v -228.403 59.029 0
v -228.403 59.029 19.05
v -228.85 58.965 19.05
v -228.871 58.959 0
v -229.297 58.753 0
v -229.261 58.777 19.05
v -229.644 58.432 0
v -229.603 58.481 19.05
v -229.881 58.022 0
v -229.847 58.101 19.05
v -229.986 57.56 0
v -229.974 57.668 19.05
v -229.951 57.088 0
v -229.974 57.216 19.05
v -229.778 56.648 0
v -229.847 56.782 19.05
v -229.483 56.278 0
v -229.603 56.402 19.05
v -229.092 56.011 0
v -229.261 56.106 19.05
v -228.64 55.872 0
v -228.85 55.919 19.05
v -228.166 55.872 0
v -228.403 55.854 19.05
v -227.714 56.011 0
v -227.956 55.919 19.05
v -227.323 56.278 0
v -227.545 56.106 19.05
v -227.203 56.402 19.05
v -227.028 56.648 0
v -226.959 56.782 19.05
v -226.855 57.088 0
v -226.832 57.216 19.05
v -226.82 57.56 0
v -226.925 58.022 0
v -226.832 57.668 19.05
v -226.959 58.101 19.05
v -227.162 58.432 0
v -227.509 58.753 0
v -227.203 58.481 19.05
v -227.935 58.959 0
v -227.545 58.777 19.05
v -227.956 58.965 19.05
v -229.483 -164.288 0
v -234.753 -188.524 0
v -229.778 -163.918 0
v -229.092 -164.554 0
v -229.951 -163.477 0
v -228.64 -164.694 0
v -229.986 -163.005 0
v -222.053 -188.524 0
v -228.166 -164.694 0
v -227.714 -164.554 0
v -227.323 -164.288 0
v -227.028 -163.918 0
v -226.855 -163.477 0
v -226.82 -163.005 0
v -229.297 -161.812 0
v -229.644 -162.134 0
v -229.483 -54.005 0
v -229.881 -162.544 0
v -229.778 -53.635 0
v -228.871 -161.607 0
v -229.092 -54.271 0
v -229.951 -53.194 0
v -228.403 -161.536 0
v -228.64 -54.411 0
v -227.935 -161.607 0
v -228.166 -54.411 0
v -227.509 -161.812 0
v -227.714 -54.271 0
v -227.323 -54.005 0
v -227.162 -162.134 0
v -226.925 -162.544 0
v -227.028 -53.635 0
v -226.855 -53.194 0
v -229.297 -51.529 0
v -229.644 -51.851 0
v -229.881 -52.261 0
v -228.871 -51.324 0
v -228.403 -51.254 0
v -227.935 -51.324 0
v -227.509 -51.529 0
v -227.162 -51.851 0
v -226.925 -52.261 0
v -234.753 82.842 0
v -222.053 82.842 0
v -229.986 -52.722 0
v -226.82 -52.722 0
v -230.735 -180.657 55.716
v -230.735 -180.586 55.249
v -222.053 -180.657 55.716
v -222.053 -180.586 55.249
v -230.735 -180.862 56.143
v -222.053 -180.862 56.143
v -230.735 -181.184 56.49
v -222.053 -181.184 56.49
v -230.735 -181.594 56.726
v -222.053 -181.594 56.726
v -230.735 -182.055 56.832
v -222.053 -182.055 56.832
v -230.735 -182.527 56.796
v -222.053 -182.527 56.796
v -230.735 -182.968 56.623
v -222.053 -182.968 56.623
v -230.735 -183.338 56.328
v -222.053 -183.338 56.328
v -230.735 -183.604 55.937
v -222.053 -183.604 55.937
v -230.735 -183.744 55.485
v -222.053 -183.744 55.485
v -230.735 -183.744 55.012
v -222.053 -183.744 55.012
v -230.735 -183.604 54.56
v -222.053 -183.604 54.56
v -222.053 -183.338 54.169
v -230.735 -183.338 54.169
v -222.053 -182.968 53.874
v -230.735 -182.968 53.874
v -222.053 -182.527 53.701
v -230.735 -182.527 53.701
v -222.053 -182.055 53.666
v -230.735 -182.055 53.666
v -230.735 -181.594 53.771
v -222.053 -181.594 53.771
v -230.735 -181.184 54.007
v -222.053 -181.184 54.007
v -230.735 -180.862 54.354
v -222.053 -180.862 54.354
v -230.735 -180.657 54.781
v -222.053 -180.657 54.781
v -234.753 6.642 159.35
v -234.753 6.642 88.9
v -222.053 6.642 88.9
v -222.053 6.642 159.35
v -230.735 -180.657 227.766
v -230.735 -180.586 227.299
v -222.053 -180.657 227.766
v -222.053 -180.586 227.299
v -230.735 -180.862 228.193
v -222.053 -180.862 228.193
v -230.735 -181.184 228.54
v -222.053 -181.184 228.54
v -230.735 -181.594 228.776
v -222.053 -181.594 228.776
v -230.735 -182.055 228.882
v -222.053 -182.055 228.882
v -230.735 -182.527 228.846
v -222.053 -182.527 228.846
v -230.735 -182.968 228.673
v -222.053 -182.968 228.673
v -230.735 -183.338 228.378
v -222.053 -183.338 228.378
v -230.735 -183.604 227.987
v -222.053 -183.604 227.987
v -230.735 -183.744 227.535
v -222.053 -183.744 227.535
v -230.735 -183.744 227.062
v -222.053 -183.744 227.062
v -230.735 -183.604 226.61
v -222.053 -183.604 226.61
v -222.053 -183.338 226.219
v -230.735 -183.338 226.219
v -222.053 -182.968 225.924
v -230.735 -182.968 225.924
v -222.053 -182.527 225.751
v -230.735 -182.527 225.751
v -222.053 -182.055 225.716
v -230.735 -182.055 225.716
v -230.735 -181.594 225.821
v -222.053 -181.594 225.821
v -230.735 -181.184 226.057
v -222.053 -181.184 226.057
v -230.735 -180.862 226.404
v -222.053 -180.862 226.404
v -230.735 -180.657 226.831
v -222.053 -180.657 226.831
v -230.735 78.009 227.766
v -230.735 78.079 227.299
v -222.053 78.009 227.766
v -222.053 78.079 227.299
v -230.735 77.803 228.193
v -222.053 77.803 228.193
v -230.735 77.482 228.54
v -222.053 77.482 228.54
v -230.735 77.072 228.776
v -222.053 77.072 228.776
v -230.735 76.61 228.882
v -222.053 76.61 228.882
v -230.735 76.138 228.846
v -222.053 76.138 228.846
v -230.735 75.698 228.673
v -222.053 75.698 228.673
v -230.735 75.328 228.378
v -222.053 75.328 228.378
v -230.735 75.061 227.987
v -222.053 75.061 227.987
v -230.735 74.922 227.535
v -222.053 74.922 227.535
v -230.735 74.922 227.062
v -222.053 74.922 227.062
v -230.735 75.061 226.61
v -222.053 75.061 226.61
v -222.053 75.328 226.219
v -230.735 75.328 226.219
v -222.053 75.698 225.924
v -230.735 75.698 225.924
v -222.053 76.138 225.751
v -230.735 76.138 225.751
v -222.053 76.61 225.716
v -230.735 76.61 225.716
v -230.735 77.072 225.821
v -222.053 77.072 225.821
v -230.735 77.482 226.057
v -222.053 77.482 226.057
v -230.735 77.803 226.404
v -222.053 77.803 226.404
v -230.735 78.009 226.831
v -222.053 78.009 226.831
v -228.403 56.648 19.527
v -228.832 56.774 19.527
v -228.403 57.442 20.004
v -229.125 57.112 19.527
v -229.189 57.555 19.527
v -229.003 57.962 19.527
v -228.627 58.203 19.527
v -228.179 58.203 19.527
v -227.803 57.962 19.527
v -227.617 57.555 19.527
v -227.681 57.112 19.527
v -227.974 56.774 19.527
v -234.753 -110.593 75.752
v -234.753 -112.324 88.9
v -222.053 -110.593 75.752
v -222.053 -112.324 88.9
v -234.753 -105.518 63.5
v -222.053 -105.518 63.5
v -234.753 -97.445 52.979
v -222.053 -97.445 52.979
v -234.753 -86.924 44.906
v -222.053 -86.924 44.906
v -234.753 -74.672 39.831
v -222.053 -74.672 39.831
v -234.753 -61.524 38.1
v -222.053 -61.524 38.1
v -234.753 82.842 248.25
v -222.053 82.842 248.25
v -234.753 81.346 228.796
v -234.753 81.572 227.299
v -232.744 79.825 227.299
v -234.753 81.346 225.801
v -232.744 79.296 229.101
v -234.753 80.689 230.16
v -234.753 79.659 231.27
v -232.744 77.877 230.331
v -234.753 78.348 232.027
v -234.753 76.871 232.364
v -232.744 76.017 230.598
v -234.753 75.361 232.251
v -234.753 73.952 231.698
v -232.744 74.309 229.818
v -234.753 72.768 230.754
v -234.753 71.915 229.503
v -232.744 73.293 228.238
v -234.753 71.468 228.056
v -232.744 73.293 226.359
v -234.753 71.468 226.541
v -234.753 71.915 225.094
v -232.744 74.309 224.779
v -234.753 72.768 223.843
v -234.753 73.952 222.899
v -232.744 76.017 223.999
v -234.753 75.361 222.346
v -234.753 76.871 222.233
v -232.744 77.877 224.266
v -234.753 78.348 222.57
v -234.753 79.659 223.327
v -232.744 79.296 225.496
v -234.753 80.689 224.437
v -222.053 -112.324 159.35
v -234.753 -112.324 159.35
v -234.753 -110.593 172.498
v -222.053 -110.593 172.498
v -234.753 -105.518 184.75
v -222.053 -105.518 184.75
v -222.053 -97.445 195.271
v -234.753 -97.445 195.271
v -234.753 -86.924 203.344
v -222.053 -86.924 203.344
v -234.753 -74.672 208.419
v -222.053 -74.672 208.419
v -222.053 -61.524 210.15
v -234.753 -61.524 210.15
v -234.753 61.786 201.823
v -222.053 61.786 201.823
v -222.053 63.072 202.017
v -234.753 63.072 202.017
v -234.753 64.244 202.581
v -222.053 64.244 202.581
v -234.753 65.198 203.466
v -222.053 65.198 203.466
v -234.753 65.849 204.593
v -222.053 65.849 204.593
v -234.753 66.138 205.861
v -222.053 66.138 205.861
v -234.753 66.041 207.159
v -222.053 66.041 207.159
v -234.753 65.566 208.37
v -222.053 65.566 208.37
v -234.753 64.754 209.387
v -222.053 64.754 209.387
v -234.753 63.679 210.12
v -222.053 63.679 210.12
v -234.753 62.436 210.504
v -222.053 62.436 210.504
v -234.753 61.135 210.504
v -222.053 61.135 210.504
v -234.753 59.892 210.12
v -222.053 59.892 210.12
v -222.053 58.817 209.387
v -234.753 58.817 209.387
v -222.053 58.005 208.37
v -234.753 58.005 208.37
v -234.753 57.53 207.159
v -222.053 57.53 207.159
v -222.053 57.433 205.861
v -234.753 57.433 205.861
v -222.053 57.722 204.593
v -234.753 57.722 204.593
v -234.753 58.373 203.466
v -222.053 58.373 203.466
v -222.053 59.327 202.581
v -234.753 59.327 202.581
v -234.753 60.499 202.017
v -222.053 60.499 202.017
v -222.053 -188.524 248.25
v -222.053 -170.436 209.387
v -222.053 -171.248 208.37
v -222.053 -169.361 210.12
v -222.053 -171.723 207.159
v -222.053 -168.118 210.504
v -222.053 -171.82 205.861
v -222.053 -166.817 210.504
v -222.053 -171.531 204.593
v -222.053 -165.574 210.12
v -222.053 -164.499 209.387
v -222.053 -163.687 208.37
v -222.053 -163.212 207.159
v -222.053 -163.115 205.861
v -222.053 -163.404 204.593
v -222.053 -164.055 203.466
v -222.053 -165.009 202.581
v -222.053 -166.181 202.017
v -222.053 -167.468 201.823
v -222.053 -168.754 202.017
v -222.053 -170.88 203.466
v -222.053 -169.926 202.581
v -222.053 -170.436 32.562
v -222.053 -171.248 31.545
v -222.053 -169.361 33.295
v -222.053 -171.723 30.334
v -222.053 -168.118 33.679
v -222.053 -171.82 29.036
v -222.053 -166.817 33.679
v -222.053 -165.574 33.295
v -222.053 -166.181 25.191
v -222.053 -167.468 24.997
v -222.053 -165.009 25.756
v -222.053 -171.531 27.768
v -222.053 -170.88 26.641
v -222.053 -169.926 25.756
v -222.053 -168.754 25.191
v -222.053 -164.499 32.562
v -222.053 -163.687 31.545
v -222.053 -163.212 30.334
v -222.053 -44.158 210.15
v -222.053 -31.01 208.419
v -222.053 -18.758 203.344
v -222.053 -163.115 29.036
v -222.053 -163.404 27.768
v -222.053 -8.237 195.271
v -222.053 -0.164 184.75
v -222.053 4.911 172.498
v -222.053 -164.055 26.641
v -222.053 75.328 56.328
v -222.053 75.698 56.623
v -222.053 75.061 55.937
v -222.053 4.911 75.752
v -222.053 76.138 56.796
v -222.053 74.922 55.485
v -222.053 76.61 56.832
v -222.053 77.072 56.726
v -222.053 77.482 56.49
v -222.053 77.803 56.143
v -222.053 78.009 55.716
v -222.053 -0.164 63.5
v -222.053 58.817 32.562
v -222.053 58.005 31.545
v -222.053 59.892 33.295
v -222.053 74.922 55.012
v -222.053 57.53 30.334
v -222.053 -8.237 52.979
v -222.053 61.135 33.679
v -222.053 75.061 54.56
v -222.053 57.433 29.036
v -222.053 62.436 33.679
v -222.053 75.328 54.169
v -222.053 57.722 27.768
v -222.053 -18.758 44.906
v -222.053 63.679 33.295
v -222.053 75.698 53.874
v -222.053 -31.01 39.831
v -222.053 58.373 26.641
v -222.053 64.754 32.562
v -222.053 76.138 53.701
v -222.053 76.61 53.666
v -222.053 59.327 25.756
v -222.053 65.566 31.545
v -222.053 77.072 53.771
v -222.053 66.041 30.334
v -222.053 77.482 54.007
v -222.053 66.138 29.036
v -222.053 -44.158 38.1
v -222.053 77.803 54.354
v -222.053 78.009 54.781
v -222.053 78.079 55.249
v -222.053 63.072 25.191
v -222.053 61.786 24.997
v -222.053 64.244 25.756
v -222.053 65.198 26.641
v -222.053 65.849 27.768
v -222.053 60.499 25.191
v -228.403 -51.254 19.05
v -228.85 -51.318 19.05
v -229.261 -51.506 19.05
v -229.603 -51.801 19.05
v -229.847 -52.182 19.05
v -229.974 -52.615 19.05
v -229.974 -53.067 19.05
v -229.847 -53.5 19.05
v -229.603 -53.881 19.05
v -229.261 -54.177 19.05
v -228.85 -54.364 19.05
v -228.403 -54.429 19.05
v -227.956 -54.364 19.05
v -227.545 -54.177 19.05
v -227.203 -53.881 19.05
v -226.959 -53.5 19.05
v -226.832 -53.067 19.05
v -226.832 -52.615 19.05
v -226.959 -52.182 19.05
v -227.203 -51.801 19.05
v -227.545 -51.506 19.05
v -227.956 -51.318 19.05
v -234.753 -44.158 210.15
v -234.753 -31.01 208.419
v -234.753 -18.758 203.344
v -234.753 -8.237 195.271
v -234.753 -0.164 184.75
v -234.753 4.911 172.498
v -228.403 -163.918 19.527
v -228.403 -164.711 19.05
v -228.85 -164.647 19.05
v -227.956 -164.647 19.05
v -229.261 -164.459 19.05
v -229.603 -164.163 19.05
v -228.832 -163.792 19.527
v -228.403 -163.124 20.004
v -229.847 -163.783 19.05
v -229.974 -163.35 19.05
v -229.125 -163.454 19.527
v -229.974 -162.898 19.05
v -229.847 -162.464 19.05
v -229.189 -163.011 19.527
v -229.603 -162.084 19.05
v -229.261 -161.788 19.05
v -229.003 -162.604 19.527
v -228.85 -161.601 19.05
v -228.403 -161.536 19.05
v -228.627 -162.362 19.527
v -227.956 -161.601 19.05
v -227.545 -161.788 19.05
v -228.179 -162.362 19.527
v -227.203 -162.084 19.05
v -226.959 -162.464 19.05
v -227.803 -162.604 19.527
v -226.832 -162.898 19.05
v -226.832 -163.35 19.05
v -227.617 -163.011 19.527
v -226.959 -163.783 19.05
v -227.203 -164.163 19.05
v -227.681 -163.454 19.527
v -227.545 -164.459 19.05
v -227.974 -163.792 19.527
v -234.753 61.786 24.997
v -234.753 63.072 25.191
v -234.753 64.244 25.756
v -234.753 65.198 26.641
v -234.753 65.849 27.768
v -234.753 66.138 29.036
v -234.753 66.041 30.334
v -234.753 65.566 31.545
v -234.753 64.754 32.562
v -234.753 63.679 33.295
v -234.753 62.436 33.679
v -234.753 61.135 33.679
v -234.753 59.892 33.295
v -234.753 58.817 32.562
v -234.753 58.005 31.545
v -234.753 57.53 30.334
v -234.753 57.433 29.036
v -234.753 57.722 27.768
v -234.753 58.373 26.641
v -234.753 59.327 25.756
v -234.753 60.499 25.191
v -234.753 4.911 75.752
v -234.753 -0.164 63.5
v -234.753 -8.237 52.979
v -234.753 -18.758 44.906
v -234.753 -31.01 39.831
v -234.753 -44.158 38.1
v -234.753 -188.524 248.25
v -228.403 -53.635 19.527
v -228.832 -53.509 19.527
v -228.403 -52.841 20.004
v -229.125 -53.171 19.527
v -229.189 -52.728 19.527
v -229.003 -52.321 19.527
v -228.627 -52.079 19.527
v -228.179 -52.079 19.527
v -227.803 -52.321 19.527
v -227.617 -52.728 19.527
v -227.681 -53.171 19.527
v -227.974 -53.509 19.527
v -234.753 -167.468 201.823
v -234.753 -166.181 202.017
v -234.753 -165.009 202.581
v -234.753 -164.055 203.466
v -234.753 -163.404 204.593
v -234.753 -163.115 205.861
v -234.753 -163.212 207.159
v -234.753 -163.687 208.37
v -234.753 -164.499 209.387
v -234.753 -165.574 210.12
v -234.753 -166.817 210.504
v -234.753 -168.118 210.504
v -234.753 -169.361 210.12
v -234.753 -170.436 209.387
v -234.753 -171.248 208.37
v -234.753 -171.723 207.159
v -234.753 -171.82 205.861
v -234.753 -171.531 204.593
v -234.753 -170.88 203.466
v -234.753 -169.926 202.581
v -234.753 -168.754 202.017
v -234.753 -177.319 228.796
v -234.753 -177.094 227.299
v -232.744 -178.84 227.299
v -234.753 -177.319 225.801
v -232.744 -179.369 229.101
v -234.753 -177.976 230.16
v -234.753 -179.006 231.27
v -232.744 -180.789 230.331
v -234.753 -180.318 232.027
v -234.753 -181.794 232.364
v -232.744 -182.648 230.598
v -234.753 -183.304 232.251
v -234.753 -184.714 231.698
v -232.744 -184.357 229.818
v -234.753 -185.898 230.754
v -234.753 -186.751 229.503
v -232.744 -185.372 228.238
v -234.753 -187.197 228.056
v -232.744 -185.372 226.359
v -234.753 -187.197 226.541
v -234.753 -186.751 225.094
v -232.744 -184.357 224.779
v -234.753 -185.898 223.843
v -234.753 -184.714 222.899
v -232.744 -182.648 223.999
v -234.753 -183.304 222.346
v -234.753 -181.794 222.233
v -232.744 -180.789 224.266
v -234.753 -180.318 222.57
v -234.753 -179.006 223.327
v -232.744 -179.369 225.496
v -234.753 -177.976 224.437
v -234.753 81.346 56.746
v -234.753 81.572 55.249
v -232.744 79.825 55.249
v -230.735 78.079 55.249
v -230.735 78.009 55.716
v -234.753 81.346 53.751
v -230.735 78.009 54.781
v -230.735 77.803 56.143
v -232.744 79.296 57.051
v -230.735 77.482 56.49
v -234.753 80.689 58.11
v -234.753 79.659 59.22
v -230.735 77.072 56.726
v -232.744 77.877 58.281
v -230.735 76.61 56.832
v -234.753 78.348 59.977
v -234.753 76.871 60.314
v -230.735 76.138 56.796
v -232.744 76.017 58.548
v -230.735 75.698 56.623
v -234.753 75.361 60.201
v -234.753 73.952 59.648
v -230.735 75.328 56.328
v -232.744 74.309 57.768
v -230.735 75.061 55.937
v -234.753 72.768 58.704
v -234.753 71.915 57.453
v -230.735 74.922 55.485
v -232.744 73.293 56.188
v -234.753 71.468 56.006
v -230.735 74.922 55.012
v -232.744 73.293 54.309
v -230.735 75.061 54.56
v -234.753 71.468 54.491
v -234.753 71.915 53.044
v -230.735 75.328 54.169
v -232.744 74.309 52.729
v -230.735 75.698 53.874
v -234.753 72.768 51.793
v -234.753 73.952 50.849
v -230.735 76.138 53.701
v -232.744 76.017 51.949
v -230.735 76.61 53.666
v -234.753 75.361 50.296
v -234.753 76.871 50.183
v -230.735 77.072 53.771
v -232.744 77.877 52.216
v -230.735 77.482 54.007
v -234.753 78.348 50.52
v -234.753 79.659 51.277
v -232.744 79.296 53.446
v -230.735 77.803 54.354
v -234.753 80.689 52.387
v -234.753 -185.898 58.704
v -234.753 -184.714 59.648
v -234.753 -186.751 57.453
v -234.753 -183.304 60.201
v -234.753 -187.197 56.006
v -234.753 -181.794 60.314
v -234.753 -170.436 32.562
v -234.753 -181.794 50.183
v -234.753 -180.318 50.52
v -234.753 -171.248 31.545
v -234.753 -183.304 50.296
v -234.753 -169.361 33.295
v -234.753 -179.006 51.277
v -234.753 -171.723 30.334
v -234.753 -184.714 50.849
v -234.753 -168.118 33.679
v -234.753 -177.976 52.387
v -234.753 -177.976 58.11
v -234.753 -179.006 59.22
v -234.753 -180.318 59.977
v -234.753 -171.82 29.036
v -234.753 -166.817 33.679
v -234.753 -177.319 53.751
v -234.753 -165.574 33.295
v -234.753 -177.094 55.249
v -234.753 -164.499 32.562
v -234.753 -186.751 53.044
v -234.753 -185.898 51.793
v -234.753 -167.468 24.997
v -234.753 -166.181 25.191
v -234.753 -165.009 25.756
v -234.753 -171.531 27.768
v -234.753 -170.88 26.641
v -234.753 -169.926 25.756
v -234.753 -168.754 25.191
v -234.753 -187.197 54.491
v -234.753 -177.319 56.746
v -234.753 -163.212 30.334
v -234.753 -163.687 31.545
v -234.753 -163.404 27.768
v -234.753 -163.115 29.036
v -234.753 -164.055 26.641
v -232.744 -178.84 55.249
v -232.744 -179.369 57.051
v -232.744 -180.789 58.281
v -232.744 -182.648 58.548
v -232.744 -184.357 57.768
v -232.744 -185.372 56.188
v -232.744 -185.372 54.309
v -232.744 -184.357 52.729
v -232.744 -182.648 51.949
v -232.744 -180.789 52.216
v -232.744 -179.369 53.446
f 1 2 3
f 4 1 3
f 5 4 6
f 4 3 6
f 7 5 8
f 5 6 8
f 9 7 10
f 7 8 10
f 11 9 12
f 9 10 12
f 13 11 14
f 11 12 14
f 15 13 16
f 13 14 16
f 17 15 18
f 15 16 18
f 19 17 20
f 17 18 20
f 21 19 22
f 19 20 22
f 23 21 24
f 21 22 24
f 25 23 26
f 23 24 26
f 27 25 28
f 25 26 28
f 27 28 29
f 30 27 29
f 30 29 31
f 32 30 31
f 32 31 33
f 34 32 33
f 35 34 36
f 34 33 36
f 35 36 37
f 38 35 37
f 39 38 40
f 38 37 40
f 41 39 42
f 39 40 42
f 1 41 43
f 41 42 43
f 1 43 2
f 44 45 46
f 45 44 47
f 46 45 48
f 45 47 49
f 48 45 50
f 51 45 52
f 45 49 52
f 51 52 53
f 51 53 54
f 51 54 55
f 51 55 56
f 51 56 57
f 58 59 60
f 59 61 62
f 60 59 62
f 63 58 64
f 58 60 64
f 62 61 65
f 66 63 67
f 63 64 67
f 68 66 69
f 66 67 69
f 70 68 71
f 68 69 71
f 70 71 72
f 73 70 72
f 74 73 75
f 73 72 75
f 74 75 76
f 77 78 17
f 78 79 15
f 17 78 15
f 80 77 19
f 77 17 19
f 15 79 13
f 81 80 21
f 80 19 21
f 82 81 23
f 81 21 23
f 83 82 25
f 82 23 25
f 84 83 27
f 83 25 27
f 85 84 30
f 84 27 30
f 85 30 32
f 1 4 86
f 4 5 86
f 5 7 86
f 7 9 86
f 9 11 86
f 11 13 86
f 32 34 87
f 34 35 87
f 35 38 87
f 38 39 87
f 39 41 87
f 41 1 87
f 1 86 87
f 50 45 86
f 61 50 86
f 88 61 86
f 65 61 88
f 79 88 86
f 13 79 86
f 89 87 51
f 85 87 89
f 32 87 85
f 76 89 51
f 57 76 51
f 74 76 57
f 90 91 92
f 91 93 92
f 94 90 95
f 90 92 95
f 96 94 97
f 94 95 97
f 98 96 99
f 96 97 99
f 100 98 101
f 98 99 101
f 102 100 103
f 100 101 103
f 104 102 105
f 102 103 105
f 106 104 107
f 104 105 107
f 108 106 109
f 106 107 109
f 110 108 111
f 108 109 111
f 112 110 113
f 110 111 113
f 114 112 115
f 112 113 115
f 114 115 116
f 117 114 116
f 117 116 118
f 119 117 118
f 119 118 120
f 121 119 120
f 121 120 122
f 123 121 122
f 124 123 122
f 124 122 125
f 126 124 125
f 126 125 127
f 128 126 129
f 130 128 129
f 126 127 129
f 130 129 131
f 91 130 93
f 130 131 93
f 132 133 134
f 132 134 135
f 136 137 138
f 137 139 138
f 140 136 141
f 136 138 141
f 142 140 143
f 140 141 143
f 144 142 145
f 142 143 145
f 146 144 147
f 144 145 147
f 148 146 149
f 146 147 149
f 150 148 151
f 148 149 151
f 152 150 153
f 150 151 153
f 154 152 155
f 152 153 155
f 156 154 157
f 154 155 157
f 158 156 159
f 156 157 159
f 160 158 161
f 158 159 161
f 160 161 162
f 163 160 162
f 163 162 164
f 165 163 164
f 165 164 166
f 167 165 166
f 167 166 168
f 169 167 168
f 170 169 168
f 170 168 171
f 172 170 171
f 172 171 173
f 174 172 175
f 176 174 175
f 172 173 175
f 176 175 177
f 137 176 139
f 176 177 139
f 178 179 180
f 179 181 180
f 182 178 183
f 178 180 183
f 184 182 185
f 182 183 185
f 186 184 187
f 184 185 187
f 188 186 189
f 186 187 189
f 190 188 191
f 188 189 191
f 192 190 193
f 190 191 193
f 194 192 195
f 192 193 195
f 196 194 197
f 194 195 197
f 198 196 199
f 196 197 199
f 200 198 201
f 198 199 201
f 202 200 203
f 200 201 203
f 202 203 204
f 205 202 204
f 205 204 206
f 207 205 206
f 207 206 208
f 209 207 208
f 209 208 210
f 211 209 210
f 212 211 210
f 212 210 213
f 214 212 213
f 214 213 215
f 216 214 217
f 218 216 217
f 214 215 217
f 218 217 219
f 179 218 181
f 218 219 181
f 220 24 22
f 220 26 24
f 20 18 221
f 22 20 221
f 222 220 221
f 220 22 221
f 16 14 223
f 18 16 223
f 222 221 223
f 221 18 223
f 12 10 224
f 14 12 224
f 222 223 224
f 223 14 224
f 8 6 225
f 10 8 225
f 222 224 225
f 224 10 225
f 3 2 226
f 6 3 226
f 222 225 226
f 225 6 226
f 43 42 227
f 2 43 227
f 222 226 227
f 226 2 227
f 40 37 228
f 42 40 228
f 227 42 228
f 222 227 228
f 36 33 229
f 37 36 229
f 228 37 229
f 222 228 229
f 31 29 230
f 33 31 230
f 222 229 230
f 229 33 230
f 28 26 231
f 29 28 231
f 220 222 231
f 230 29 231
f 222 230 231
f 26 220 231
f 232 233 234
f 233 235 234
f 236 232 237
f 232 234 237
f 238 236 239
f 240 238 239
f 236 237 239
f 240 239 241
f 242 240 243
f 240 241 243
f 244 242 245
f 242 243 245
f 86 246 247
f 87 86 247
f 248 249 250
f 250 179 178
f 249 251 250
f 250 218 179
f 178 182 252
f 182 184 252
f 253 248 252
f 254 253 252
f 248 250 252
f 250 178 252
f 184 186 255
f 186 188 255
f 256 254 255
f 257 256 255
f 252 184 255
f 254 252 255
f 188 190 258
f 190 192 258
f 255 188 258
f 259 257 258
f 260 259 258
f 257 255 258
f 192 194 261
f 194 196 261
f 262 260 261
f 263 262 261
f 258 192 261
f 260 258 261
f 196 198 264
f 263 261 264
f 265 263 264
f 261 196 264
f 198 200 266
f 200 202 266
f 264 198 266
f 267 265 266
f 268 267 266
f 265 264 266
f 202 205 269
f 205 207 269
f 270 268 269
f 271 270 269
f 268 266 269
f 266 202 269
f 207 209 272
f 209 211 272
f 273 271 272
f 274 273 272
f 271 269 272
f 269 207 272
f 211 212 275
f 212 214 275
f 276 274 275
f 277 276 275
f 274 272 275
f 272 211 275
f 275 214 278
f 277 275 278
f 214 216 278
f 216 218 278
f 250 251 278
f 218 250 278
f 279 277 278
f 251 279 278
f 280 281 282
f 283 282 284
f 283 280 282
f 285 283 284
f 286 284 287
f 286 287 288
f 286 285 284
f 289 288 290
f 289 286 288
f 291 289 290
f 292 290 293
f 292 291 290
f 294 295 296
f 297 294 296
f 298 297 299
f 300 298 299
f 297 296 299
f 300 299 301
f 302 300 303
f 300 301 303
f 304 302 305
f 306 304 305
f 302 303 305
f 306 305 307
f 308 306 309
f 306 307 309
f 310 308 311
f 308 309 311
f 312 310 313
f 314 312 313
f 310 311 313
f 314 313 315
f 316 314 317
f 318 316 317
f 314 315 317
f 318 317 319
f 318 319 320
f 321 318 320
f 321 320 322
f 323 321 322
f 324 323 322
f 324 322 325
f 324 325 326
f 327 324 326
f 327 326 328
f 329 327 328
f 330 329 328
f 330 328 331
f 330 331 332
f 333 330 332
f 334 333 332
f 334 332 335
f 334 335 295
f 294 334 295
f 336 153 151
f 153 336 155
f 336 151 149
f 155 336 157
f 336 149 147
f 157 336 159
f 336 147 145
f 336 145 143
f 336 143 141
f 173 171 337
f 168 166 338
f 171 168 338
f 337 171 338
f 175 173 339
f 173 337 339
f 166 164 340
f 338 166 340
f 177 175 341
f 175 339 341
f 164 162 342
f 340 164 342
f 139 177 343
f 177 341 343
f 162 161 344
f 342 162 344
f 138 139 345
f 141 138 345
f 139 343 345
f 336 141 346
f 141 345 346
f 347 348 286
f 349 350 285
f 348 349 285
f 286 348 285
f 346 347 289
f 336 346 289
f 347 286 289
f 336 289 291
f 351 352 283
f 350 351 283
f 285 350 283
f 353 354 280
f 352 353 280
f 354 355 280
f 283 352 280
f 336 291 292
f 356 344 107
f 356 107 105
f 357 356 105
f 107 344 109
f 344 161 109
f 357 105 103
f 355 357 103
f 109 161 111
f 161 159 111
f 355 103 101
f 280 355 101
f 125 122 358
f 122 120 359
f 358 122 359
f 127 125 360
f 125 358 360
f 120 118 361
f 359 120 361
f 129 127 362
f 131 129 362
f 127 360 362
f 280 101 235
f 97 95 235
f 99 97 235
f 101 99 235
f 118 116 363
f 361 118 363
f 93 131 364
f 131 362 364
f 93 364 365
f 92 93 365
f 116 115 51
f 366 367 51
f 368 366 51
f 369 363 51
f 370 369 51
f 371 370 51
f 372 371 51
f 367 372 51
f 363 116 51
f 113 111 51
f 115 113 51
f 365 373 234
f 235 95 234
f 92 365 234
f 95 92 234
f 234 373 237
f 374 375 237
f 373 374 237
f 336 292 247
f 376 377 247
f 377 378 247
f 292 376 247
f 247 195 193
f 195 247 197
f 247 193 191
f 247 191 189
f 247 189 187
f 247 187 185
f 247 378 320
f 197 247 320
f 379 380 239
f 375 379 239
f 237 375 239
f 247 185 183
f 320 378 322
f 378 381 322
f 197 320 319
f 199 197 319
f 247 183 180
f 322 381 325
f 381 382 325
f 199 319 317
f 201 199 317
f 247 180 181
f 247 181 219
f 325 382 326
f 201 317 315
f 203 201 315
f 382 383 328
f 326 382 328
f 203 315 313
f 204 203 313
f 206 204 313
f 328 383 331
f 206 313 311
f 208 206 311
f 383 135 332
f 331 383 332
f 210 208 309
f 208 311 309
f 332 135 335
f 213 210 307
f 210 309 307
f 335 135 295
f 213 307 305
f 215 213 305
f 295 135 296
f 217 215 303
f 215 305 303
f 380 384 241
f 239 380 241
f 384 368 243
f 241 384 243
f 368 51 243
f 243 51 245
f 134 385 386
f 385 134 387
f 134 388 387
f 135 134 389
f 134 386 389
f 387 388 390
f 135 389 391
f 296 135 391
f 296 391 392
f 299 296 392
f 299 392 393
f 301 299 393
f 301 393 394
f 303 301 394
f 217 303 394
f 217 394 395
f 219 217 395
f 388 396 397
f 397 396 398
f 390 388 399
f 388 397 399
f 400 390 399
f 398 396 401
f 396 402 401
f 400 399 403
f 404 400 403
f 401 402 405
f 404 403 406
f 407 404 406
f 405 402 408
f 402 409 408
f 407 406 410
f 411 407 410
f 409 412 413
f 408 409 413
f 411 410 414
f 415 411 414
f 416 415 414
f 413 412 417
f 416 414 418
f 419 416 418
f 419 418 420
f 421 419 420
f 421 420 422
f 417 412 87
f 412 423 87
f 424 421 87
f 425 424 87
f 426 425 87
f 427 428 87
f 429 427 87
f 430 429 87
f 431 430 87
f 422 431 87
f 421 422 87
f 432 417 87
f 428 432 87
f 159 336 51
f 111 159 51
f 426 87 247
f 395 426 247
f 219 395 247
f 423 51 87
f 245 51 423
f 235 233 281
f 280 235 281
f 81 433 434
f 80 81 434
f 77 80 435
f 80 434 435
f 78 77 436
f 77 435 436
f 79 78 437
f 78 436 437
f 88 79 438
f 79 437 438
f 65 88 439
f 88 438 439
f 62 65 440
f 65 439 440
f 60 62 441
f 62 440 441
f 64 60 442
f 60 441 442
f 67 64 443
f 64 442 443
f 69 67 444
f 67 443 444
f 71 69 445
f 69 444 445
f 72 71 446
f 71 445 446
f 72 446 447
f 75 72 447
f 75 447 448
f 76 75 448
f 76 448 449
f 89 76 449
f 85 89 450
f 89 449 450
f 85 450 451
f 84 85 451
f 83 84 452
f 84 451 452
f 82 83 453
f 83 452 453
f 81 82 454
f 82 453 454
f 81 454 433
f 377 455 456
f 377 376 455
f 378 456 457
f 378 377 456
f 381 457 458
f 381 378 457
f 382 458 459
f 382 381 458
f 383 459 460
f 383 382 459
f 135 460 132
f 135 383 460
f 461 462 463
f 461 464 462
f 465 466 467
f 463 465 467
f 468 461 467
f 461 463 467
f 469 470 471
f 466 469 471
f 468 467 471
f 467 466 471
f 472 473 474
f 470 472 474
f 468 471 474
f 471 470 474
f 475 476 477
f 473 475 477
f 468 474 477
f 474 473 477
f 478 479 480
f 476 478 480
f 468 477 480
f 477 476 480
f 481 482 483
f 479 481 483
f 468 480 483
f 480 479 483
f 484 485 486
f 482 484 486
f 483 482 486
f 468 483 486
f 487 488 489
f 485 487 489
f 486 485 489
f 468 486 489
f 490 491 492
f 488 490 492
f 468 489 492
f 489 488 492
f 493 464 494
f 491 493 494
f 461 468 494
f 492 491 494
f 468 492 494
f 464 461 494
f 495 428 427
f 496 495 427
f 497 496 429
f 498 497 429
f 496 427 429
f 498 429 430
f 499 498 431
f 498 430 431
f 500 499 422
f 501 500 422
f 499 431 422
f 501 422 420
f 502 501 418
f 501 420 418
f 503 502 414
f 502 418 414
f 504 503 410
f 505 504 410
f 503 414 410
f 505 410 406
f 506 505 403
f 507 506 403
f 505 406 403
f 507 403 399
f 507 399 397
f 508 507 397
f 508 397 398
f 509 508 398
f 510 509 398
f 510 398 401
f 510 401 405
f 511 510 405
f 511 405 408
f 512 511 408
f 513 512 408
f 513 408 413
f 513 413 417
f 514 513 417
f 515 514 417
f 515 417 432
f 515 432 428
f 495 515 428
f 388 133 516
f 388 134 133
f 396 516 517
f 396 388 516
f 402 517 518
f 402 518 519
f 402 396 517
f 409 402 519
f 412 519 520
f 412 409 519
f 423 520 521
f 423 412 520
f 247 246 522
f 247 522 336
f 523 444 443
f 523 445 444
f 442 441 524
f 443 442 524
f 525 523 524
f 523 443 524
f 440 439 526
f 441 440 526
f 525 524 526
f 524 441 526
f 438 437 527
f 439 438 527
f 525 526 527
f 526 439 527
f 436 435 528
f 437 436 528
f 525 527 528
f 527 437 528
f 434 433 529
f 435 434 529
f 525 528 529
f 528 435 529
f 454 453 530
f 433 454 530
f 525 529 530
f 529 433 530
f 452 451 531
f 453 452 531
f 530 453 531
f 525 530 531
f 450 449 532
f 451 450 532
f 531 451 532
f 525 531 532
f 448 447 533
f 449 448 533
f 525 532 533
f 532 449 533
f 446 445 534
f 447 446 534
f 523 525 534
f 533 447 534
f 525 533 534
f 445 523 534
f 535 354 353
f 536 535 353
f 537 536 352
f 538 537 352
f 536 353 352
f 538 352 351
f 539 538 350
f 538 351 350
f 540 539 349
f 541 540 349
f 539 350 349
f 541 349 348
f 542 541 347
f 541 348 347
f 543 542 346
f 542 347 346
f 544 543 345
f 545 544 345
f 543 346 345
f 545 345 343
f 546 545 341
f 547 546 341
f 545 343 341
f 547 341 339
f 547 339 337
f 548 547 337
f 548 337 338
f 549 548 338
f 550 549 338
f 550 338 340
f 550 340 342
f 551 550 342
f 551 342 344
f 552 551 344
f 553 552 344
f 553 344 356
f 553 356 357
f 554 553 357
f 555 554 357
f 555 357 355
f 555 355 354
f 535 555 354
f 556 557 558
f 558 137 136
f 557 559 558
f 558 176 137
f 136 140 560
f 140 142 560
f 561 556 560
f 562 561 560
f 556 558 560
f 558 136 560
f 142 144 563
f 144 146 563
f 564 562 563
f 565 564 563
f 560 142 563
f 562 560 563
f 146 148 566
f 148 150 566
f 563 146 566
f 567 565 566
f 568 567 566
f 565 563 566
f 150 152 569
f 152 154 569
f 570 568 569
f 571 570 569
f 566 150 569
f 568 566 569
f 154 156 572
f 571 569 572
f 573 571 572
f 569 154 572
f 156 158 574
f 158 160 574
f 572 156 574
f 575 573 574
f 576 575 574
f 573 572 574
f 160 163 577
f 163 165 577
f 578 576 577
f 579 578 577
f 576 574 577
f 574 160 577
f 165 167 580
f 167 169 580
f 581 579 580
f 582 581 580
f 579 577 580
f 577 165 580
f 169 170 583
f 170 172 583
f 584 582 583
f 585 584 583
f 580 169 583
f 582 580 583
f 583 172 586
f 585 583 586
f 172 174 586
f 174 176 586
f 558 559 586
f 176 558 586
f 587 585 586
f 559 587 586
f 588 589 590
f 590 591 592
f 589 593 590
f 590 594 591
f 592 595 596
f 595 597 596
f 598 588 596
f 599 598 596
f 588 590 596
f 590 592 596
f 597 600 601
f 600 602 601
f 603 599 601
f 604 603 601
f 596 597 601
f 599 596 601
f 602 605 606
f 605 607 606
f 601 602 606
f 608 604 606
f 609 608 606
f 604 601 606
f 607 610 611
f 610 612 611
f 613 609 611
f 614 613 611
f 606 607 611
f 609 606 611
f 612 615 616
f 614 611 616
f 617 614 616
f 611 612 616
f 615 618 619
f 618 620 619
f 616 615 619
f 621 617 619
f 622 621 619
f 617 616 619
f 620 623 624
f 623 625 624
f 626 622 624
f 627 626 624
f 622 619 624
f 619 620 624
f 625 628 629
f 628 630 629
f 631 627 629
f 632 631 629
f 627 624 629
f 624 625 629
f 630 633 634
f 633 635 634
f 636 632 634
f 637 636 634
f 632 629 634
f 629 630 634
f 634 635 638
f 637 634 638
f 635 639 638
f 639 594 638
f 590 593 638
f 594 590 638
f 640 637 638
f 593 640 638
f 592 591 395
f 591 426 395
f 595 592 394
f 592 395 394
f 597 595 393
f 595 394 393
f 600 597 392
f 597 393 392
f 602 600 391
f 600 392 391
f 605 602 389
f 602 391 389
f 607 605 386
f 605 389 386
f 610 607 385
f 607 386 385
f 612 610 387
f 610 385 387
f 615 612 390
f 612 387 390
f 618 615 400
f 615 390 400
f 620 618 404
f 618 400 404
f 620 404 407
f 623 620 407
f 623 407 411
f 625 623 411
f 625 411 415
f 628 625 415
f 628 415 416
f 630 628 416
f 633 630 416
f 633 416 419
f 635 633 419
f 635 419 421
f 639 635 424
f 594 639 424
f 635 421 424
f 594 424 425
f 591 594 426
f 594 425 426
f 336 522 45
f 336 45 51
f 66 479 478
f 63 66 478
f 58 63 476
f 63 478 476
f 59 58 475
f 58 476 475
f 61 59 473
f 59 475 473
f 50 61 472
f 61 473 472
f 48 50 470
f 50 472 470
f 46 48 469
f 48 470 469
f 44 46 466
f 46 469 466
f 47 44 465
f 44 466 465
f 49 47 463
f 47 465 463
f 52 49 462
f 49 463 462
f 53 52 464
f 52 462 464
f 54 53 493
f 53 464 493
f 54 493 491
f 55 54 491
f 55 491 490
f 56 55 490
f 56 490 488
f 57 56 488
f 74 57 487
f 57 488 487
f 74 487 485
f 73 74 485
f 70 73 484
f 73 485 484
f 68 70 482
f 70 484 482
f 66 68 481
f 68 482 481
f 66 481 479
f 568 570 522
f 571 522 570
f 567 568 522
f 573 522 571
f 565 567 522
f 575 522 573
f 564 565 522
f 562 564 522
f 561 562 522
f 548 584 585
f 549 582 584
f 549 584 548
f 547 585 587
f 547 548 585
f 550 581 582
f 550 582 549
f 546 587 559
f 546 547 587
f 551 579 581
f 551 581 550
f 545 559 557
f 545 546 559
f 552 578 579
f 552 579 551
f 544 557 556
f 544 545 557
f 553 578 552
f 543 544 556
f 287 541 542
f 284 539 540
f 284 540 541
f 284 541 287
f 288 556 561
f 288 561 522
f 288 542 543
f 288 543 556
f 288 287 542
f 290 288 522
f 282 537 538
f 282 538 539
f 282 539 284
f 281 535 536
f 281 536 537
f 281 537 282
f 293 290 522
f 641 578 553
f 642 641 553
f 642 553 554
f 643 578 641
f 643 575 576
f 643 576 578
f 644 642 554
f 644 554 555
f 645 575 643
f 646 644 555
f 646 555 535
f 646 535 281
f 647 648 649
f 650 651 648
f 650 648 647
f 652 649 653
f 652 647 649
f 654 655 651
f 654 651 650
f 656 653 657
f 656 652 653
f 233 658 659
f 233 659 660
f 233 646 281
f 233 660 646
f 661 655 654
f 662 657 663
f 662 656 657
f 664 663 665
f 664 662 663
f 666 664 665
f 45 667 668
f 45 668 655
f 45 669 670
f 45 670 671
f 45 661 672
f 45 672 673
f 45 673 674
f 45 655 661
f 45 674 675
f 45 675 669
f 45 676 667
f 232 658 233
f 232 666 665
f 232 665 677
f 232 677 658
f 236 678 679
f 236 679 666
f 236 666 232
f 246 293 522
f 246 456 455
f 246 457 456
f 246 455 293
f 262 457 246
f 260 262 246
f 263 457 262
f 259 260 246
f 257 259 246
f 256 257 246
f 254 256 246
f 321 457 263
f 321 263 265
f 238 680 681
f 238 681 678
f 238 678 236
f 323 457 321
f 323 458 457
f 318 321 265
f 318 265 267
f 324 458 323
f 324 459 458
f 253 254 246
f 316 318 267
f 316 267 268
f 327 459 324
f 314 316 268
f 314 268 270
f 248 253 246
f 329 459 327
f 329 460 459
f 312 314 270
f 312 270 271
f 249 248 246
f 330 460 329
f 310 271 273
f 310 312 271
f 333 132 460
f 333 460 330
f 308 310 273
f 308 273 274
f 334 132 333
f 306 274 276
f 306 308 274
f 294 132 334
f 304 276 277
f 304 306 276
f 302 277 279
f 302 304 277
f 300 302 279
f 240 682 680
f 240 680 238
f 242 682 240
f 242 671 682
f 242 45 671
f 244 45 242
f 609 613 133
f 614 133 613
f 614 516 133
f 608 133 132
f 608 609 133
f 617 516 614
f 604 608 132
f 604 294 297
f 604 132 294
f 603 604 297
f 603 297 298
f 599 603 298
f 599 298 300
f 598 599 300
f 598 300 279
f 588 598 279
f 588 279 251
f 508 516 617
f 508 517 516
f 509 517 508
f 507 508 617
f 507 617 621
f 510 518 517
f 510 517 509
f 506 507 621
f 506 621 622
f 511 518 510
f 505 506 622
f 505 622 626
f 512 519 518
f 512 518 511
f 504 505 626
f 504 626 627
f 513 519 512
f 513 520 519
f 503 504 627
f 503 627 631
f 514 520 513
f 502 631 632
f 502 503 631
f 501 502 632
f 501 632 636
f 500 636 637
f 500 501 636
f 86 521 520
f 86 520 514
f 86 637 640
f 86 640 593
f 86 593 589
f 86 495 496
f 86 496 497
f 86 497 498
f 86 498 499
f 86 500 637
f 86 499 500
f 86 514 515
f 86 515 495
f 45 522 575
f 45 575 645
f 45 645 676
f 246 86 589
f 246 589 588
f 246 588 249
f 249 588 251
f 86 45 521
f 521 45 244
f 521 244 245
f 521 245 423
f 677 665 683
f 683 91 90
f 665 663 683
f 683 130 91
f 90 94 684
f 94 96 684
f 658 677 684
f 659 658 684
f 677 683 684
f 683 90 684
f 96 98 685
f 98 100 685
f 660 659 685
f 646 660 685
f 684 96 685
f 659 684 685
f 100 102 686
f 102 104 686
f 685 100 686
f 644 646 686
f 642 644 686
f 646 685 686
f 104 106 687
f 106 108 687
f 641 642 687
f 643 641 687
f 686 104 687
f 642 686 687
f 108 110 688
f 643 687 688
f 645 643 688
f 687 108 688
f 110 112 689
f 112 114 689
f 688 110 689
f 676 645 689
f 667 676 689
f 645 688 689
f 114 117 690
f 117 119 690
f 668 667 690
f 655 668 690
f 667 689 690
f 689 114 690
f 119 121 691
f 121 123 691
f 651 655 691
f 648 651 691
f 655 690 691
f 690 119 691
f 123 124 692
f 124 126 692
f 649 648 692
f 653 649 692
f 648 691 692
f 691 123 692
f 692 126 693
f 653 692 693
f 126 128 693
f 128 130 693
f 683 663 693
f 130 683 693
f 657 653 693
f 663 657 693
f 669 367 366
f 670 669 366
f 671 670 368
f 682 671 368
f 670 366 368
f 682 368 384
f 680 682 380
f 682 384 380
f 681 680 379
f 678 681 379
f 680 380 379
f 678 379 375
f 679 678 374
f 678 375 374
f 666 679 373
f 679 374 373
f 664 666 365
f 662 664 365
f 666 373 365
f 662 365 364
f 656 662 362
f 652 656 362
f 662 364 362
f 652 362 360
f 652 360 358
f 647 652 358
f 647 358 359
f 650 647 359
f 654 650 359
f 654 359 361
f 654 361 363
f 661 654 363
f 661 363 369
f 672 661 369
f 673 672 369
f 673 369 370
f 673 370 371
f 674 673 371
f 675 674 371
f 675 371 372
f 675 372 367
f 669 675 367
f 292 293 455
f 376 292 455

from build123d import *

# Parameters (mm, degrees)
SKETCH1_W                = 12.7
SKETCH1_H                = 271.365530146
BOSS_EXTRUDE1_DEPTH      = 248.25
SKETCH2_W                = 172.05
SKETCH2_H                = 118.965530146
CUT_EXTRUDE1_DEPTH       = 312.978479114
FILLET1_R                = 50.8
HOLE1_D                  = 3.175
HOLE1_DEPTH              = 31.75
HOLE1_CSINK_D            = 10.16
HOLE1_CSINK_ANGLE        = 82
HOLE1_TIP                = 0.953866233
HOLE2_D                  = 3.175
HOLE2_DEPTH              = 31.75
HOLE2_CSINK_D            = 10.16
HOLE2_CSINK_ANGLE        = 82
HOLE2_TIP                = 0.953866233
F_5_16_CLEARANCE_HOLE1_D = 8.72998


with BuildPart() as part:
    # Sketch1 → Boss-Extrude1 (new body)
    with BuildSketch(Plane.XY):
        with Locations((-228.402967181, -52.841023691)):
            Rectangle(SKETCH1_W, SKETCH1_H)
    extrude(amount=BOSS_EXTRUDE1_DEPTH)

    # Sketch2 → Cut-Extrude1 (cut, through all)
    with BuildSketch(Plane.ZY.offset(234.752967181)):
        with Locations((124.125, -52.841023691)):
            Rectangle(SKETCH2_W, SKETCH2_H)
    extrude(amount=-CUT_EXTRUDE1_DEPTH, mode=Mode.SUBTRACT)

    # Fillet1
    fillet1_edges = [part.edges().sort_by_distance(p)[0] for p in [
        (-228.402967181, 6.641741382, 210.15),
        (-228.402967181, -112.323788764, 210.15),
        (-228.402967181, -112.323788764, 38.1),
        (-228.402967181, 6.641741382, 38.1),
    ]]
    fillet(fillet1_edges, radius=FILLET1_R)

    # Hole1
    with Locations(Plane(origin=(181.039434513, -52.974999997, -12.7), x_dir=(0, -1, 0), z_dir=(0, 0, -1))):
        with Locations((129.198788767, 384.042401694), (-129.466741379, 384.042401694), (-129.466741379, 304.786761906), (-110.416741379, 409.442401694), (-0.133976306, 409.442401694), (110.148788767, 409.442401694), (129.198788767, 304.786761906)):
            CounterSinkHole(HOLE1_D / 2, HOLE1_CSINK_D / 2, depth=HOLE1_DEPTH, counter_sink_angle=HOLE1_CSINK_ANGLE)
            with Locations((0, 0, -(HOLE1_DEPTH + HOLE1_TIP / 2))):  # 118° drill point
                Cone(0, HOLE1_D / 2, HOLE1_TIP, mode=Mode.SUBTRACT)

    # Hole2
    with Locations(Plane(origin=(-234.752967181, -52.974999997, -1073.364195846), x_dir=(0, -1, 0), z_dir=(-1, 0, 0))):
        with Locations((-129.466741379, 1300.662770337), (-129.466741379, 1128.612770337), (129.198788767, 1128.612770337), (129.198788767, 1300.662770337)):
            CounterSinkHole(HOLE2_D / 2, HOLE2_CSINK_D / 2, depth=HOLE2_DEPTH, counter_sink_angle=HOLE2_CSINK_ANGLE)
            with Locations((0, 0, -(HOLE2_DEPTH + HOLE2_TIP / 2))):  # 118° drill point
                Cone(0, HOLE2_D / 2, HOLE2_TIP, mode=Mode.SUBTRACT)

    # 5/16 Clearance Hole1 (through all)
    with Locations(Plane.ZY.offset(234.752967181)):
        with Locations((206.1876, -167.467547412), (206.1876, 61.78550003), (29.3624, 61.78550003), (29.3624, -167.467547412)):
            Hole(F_5_16_CLEARANCE_HOLE1_D / 2)


solid = part.part
